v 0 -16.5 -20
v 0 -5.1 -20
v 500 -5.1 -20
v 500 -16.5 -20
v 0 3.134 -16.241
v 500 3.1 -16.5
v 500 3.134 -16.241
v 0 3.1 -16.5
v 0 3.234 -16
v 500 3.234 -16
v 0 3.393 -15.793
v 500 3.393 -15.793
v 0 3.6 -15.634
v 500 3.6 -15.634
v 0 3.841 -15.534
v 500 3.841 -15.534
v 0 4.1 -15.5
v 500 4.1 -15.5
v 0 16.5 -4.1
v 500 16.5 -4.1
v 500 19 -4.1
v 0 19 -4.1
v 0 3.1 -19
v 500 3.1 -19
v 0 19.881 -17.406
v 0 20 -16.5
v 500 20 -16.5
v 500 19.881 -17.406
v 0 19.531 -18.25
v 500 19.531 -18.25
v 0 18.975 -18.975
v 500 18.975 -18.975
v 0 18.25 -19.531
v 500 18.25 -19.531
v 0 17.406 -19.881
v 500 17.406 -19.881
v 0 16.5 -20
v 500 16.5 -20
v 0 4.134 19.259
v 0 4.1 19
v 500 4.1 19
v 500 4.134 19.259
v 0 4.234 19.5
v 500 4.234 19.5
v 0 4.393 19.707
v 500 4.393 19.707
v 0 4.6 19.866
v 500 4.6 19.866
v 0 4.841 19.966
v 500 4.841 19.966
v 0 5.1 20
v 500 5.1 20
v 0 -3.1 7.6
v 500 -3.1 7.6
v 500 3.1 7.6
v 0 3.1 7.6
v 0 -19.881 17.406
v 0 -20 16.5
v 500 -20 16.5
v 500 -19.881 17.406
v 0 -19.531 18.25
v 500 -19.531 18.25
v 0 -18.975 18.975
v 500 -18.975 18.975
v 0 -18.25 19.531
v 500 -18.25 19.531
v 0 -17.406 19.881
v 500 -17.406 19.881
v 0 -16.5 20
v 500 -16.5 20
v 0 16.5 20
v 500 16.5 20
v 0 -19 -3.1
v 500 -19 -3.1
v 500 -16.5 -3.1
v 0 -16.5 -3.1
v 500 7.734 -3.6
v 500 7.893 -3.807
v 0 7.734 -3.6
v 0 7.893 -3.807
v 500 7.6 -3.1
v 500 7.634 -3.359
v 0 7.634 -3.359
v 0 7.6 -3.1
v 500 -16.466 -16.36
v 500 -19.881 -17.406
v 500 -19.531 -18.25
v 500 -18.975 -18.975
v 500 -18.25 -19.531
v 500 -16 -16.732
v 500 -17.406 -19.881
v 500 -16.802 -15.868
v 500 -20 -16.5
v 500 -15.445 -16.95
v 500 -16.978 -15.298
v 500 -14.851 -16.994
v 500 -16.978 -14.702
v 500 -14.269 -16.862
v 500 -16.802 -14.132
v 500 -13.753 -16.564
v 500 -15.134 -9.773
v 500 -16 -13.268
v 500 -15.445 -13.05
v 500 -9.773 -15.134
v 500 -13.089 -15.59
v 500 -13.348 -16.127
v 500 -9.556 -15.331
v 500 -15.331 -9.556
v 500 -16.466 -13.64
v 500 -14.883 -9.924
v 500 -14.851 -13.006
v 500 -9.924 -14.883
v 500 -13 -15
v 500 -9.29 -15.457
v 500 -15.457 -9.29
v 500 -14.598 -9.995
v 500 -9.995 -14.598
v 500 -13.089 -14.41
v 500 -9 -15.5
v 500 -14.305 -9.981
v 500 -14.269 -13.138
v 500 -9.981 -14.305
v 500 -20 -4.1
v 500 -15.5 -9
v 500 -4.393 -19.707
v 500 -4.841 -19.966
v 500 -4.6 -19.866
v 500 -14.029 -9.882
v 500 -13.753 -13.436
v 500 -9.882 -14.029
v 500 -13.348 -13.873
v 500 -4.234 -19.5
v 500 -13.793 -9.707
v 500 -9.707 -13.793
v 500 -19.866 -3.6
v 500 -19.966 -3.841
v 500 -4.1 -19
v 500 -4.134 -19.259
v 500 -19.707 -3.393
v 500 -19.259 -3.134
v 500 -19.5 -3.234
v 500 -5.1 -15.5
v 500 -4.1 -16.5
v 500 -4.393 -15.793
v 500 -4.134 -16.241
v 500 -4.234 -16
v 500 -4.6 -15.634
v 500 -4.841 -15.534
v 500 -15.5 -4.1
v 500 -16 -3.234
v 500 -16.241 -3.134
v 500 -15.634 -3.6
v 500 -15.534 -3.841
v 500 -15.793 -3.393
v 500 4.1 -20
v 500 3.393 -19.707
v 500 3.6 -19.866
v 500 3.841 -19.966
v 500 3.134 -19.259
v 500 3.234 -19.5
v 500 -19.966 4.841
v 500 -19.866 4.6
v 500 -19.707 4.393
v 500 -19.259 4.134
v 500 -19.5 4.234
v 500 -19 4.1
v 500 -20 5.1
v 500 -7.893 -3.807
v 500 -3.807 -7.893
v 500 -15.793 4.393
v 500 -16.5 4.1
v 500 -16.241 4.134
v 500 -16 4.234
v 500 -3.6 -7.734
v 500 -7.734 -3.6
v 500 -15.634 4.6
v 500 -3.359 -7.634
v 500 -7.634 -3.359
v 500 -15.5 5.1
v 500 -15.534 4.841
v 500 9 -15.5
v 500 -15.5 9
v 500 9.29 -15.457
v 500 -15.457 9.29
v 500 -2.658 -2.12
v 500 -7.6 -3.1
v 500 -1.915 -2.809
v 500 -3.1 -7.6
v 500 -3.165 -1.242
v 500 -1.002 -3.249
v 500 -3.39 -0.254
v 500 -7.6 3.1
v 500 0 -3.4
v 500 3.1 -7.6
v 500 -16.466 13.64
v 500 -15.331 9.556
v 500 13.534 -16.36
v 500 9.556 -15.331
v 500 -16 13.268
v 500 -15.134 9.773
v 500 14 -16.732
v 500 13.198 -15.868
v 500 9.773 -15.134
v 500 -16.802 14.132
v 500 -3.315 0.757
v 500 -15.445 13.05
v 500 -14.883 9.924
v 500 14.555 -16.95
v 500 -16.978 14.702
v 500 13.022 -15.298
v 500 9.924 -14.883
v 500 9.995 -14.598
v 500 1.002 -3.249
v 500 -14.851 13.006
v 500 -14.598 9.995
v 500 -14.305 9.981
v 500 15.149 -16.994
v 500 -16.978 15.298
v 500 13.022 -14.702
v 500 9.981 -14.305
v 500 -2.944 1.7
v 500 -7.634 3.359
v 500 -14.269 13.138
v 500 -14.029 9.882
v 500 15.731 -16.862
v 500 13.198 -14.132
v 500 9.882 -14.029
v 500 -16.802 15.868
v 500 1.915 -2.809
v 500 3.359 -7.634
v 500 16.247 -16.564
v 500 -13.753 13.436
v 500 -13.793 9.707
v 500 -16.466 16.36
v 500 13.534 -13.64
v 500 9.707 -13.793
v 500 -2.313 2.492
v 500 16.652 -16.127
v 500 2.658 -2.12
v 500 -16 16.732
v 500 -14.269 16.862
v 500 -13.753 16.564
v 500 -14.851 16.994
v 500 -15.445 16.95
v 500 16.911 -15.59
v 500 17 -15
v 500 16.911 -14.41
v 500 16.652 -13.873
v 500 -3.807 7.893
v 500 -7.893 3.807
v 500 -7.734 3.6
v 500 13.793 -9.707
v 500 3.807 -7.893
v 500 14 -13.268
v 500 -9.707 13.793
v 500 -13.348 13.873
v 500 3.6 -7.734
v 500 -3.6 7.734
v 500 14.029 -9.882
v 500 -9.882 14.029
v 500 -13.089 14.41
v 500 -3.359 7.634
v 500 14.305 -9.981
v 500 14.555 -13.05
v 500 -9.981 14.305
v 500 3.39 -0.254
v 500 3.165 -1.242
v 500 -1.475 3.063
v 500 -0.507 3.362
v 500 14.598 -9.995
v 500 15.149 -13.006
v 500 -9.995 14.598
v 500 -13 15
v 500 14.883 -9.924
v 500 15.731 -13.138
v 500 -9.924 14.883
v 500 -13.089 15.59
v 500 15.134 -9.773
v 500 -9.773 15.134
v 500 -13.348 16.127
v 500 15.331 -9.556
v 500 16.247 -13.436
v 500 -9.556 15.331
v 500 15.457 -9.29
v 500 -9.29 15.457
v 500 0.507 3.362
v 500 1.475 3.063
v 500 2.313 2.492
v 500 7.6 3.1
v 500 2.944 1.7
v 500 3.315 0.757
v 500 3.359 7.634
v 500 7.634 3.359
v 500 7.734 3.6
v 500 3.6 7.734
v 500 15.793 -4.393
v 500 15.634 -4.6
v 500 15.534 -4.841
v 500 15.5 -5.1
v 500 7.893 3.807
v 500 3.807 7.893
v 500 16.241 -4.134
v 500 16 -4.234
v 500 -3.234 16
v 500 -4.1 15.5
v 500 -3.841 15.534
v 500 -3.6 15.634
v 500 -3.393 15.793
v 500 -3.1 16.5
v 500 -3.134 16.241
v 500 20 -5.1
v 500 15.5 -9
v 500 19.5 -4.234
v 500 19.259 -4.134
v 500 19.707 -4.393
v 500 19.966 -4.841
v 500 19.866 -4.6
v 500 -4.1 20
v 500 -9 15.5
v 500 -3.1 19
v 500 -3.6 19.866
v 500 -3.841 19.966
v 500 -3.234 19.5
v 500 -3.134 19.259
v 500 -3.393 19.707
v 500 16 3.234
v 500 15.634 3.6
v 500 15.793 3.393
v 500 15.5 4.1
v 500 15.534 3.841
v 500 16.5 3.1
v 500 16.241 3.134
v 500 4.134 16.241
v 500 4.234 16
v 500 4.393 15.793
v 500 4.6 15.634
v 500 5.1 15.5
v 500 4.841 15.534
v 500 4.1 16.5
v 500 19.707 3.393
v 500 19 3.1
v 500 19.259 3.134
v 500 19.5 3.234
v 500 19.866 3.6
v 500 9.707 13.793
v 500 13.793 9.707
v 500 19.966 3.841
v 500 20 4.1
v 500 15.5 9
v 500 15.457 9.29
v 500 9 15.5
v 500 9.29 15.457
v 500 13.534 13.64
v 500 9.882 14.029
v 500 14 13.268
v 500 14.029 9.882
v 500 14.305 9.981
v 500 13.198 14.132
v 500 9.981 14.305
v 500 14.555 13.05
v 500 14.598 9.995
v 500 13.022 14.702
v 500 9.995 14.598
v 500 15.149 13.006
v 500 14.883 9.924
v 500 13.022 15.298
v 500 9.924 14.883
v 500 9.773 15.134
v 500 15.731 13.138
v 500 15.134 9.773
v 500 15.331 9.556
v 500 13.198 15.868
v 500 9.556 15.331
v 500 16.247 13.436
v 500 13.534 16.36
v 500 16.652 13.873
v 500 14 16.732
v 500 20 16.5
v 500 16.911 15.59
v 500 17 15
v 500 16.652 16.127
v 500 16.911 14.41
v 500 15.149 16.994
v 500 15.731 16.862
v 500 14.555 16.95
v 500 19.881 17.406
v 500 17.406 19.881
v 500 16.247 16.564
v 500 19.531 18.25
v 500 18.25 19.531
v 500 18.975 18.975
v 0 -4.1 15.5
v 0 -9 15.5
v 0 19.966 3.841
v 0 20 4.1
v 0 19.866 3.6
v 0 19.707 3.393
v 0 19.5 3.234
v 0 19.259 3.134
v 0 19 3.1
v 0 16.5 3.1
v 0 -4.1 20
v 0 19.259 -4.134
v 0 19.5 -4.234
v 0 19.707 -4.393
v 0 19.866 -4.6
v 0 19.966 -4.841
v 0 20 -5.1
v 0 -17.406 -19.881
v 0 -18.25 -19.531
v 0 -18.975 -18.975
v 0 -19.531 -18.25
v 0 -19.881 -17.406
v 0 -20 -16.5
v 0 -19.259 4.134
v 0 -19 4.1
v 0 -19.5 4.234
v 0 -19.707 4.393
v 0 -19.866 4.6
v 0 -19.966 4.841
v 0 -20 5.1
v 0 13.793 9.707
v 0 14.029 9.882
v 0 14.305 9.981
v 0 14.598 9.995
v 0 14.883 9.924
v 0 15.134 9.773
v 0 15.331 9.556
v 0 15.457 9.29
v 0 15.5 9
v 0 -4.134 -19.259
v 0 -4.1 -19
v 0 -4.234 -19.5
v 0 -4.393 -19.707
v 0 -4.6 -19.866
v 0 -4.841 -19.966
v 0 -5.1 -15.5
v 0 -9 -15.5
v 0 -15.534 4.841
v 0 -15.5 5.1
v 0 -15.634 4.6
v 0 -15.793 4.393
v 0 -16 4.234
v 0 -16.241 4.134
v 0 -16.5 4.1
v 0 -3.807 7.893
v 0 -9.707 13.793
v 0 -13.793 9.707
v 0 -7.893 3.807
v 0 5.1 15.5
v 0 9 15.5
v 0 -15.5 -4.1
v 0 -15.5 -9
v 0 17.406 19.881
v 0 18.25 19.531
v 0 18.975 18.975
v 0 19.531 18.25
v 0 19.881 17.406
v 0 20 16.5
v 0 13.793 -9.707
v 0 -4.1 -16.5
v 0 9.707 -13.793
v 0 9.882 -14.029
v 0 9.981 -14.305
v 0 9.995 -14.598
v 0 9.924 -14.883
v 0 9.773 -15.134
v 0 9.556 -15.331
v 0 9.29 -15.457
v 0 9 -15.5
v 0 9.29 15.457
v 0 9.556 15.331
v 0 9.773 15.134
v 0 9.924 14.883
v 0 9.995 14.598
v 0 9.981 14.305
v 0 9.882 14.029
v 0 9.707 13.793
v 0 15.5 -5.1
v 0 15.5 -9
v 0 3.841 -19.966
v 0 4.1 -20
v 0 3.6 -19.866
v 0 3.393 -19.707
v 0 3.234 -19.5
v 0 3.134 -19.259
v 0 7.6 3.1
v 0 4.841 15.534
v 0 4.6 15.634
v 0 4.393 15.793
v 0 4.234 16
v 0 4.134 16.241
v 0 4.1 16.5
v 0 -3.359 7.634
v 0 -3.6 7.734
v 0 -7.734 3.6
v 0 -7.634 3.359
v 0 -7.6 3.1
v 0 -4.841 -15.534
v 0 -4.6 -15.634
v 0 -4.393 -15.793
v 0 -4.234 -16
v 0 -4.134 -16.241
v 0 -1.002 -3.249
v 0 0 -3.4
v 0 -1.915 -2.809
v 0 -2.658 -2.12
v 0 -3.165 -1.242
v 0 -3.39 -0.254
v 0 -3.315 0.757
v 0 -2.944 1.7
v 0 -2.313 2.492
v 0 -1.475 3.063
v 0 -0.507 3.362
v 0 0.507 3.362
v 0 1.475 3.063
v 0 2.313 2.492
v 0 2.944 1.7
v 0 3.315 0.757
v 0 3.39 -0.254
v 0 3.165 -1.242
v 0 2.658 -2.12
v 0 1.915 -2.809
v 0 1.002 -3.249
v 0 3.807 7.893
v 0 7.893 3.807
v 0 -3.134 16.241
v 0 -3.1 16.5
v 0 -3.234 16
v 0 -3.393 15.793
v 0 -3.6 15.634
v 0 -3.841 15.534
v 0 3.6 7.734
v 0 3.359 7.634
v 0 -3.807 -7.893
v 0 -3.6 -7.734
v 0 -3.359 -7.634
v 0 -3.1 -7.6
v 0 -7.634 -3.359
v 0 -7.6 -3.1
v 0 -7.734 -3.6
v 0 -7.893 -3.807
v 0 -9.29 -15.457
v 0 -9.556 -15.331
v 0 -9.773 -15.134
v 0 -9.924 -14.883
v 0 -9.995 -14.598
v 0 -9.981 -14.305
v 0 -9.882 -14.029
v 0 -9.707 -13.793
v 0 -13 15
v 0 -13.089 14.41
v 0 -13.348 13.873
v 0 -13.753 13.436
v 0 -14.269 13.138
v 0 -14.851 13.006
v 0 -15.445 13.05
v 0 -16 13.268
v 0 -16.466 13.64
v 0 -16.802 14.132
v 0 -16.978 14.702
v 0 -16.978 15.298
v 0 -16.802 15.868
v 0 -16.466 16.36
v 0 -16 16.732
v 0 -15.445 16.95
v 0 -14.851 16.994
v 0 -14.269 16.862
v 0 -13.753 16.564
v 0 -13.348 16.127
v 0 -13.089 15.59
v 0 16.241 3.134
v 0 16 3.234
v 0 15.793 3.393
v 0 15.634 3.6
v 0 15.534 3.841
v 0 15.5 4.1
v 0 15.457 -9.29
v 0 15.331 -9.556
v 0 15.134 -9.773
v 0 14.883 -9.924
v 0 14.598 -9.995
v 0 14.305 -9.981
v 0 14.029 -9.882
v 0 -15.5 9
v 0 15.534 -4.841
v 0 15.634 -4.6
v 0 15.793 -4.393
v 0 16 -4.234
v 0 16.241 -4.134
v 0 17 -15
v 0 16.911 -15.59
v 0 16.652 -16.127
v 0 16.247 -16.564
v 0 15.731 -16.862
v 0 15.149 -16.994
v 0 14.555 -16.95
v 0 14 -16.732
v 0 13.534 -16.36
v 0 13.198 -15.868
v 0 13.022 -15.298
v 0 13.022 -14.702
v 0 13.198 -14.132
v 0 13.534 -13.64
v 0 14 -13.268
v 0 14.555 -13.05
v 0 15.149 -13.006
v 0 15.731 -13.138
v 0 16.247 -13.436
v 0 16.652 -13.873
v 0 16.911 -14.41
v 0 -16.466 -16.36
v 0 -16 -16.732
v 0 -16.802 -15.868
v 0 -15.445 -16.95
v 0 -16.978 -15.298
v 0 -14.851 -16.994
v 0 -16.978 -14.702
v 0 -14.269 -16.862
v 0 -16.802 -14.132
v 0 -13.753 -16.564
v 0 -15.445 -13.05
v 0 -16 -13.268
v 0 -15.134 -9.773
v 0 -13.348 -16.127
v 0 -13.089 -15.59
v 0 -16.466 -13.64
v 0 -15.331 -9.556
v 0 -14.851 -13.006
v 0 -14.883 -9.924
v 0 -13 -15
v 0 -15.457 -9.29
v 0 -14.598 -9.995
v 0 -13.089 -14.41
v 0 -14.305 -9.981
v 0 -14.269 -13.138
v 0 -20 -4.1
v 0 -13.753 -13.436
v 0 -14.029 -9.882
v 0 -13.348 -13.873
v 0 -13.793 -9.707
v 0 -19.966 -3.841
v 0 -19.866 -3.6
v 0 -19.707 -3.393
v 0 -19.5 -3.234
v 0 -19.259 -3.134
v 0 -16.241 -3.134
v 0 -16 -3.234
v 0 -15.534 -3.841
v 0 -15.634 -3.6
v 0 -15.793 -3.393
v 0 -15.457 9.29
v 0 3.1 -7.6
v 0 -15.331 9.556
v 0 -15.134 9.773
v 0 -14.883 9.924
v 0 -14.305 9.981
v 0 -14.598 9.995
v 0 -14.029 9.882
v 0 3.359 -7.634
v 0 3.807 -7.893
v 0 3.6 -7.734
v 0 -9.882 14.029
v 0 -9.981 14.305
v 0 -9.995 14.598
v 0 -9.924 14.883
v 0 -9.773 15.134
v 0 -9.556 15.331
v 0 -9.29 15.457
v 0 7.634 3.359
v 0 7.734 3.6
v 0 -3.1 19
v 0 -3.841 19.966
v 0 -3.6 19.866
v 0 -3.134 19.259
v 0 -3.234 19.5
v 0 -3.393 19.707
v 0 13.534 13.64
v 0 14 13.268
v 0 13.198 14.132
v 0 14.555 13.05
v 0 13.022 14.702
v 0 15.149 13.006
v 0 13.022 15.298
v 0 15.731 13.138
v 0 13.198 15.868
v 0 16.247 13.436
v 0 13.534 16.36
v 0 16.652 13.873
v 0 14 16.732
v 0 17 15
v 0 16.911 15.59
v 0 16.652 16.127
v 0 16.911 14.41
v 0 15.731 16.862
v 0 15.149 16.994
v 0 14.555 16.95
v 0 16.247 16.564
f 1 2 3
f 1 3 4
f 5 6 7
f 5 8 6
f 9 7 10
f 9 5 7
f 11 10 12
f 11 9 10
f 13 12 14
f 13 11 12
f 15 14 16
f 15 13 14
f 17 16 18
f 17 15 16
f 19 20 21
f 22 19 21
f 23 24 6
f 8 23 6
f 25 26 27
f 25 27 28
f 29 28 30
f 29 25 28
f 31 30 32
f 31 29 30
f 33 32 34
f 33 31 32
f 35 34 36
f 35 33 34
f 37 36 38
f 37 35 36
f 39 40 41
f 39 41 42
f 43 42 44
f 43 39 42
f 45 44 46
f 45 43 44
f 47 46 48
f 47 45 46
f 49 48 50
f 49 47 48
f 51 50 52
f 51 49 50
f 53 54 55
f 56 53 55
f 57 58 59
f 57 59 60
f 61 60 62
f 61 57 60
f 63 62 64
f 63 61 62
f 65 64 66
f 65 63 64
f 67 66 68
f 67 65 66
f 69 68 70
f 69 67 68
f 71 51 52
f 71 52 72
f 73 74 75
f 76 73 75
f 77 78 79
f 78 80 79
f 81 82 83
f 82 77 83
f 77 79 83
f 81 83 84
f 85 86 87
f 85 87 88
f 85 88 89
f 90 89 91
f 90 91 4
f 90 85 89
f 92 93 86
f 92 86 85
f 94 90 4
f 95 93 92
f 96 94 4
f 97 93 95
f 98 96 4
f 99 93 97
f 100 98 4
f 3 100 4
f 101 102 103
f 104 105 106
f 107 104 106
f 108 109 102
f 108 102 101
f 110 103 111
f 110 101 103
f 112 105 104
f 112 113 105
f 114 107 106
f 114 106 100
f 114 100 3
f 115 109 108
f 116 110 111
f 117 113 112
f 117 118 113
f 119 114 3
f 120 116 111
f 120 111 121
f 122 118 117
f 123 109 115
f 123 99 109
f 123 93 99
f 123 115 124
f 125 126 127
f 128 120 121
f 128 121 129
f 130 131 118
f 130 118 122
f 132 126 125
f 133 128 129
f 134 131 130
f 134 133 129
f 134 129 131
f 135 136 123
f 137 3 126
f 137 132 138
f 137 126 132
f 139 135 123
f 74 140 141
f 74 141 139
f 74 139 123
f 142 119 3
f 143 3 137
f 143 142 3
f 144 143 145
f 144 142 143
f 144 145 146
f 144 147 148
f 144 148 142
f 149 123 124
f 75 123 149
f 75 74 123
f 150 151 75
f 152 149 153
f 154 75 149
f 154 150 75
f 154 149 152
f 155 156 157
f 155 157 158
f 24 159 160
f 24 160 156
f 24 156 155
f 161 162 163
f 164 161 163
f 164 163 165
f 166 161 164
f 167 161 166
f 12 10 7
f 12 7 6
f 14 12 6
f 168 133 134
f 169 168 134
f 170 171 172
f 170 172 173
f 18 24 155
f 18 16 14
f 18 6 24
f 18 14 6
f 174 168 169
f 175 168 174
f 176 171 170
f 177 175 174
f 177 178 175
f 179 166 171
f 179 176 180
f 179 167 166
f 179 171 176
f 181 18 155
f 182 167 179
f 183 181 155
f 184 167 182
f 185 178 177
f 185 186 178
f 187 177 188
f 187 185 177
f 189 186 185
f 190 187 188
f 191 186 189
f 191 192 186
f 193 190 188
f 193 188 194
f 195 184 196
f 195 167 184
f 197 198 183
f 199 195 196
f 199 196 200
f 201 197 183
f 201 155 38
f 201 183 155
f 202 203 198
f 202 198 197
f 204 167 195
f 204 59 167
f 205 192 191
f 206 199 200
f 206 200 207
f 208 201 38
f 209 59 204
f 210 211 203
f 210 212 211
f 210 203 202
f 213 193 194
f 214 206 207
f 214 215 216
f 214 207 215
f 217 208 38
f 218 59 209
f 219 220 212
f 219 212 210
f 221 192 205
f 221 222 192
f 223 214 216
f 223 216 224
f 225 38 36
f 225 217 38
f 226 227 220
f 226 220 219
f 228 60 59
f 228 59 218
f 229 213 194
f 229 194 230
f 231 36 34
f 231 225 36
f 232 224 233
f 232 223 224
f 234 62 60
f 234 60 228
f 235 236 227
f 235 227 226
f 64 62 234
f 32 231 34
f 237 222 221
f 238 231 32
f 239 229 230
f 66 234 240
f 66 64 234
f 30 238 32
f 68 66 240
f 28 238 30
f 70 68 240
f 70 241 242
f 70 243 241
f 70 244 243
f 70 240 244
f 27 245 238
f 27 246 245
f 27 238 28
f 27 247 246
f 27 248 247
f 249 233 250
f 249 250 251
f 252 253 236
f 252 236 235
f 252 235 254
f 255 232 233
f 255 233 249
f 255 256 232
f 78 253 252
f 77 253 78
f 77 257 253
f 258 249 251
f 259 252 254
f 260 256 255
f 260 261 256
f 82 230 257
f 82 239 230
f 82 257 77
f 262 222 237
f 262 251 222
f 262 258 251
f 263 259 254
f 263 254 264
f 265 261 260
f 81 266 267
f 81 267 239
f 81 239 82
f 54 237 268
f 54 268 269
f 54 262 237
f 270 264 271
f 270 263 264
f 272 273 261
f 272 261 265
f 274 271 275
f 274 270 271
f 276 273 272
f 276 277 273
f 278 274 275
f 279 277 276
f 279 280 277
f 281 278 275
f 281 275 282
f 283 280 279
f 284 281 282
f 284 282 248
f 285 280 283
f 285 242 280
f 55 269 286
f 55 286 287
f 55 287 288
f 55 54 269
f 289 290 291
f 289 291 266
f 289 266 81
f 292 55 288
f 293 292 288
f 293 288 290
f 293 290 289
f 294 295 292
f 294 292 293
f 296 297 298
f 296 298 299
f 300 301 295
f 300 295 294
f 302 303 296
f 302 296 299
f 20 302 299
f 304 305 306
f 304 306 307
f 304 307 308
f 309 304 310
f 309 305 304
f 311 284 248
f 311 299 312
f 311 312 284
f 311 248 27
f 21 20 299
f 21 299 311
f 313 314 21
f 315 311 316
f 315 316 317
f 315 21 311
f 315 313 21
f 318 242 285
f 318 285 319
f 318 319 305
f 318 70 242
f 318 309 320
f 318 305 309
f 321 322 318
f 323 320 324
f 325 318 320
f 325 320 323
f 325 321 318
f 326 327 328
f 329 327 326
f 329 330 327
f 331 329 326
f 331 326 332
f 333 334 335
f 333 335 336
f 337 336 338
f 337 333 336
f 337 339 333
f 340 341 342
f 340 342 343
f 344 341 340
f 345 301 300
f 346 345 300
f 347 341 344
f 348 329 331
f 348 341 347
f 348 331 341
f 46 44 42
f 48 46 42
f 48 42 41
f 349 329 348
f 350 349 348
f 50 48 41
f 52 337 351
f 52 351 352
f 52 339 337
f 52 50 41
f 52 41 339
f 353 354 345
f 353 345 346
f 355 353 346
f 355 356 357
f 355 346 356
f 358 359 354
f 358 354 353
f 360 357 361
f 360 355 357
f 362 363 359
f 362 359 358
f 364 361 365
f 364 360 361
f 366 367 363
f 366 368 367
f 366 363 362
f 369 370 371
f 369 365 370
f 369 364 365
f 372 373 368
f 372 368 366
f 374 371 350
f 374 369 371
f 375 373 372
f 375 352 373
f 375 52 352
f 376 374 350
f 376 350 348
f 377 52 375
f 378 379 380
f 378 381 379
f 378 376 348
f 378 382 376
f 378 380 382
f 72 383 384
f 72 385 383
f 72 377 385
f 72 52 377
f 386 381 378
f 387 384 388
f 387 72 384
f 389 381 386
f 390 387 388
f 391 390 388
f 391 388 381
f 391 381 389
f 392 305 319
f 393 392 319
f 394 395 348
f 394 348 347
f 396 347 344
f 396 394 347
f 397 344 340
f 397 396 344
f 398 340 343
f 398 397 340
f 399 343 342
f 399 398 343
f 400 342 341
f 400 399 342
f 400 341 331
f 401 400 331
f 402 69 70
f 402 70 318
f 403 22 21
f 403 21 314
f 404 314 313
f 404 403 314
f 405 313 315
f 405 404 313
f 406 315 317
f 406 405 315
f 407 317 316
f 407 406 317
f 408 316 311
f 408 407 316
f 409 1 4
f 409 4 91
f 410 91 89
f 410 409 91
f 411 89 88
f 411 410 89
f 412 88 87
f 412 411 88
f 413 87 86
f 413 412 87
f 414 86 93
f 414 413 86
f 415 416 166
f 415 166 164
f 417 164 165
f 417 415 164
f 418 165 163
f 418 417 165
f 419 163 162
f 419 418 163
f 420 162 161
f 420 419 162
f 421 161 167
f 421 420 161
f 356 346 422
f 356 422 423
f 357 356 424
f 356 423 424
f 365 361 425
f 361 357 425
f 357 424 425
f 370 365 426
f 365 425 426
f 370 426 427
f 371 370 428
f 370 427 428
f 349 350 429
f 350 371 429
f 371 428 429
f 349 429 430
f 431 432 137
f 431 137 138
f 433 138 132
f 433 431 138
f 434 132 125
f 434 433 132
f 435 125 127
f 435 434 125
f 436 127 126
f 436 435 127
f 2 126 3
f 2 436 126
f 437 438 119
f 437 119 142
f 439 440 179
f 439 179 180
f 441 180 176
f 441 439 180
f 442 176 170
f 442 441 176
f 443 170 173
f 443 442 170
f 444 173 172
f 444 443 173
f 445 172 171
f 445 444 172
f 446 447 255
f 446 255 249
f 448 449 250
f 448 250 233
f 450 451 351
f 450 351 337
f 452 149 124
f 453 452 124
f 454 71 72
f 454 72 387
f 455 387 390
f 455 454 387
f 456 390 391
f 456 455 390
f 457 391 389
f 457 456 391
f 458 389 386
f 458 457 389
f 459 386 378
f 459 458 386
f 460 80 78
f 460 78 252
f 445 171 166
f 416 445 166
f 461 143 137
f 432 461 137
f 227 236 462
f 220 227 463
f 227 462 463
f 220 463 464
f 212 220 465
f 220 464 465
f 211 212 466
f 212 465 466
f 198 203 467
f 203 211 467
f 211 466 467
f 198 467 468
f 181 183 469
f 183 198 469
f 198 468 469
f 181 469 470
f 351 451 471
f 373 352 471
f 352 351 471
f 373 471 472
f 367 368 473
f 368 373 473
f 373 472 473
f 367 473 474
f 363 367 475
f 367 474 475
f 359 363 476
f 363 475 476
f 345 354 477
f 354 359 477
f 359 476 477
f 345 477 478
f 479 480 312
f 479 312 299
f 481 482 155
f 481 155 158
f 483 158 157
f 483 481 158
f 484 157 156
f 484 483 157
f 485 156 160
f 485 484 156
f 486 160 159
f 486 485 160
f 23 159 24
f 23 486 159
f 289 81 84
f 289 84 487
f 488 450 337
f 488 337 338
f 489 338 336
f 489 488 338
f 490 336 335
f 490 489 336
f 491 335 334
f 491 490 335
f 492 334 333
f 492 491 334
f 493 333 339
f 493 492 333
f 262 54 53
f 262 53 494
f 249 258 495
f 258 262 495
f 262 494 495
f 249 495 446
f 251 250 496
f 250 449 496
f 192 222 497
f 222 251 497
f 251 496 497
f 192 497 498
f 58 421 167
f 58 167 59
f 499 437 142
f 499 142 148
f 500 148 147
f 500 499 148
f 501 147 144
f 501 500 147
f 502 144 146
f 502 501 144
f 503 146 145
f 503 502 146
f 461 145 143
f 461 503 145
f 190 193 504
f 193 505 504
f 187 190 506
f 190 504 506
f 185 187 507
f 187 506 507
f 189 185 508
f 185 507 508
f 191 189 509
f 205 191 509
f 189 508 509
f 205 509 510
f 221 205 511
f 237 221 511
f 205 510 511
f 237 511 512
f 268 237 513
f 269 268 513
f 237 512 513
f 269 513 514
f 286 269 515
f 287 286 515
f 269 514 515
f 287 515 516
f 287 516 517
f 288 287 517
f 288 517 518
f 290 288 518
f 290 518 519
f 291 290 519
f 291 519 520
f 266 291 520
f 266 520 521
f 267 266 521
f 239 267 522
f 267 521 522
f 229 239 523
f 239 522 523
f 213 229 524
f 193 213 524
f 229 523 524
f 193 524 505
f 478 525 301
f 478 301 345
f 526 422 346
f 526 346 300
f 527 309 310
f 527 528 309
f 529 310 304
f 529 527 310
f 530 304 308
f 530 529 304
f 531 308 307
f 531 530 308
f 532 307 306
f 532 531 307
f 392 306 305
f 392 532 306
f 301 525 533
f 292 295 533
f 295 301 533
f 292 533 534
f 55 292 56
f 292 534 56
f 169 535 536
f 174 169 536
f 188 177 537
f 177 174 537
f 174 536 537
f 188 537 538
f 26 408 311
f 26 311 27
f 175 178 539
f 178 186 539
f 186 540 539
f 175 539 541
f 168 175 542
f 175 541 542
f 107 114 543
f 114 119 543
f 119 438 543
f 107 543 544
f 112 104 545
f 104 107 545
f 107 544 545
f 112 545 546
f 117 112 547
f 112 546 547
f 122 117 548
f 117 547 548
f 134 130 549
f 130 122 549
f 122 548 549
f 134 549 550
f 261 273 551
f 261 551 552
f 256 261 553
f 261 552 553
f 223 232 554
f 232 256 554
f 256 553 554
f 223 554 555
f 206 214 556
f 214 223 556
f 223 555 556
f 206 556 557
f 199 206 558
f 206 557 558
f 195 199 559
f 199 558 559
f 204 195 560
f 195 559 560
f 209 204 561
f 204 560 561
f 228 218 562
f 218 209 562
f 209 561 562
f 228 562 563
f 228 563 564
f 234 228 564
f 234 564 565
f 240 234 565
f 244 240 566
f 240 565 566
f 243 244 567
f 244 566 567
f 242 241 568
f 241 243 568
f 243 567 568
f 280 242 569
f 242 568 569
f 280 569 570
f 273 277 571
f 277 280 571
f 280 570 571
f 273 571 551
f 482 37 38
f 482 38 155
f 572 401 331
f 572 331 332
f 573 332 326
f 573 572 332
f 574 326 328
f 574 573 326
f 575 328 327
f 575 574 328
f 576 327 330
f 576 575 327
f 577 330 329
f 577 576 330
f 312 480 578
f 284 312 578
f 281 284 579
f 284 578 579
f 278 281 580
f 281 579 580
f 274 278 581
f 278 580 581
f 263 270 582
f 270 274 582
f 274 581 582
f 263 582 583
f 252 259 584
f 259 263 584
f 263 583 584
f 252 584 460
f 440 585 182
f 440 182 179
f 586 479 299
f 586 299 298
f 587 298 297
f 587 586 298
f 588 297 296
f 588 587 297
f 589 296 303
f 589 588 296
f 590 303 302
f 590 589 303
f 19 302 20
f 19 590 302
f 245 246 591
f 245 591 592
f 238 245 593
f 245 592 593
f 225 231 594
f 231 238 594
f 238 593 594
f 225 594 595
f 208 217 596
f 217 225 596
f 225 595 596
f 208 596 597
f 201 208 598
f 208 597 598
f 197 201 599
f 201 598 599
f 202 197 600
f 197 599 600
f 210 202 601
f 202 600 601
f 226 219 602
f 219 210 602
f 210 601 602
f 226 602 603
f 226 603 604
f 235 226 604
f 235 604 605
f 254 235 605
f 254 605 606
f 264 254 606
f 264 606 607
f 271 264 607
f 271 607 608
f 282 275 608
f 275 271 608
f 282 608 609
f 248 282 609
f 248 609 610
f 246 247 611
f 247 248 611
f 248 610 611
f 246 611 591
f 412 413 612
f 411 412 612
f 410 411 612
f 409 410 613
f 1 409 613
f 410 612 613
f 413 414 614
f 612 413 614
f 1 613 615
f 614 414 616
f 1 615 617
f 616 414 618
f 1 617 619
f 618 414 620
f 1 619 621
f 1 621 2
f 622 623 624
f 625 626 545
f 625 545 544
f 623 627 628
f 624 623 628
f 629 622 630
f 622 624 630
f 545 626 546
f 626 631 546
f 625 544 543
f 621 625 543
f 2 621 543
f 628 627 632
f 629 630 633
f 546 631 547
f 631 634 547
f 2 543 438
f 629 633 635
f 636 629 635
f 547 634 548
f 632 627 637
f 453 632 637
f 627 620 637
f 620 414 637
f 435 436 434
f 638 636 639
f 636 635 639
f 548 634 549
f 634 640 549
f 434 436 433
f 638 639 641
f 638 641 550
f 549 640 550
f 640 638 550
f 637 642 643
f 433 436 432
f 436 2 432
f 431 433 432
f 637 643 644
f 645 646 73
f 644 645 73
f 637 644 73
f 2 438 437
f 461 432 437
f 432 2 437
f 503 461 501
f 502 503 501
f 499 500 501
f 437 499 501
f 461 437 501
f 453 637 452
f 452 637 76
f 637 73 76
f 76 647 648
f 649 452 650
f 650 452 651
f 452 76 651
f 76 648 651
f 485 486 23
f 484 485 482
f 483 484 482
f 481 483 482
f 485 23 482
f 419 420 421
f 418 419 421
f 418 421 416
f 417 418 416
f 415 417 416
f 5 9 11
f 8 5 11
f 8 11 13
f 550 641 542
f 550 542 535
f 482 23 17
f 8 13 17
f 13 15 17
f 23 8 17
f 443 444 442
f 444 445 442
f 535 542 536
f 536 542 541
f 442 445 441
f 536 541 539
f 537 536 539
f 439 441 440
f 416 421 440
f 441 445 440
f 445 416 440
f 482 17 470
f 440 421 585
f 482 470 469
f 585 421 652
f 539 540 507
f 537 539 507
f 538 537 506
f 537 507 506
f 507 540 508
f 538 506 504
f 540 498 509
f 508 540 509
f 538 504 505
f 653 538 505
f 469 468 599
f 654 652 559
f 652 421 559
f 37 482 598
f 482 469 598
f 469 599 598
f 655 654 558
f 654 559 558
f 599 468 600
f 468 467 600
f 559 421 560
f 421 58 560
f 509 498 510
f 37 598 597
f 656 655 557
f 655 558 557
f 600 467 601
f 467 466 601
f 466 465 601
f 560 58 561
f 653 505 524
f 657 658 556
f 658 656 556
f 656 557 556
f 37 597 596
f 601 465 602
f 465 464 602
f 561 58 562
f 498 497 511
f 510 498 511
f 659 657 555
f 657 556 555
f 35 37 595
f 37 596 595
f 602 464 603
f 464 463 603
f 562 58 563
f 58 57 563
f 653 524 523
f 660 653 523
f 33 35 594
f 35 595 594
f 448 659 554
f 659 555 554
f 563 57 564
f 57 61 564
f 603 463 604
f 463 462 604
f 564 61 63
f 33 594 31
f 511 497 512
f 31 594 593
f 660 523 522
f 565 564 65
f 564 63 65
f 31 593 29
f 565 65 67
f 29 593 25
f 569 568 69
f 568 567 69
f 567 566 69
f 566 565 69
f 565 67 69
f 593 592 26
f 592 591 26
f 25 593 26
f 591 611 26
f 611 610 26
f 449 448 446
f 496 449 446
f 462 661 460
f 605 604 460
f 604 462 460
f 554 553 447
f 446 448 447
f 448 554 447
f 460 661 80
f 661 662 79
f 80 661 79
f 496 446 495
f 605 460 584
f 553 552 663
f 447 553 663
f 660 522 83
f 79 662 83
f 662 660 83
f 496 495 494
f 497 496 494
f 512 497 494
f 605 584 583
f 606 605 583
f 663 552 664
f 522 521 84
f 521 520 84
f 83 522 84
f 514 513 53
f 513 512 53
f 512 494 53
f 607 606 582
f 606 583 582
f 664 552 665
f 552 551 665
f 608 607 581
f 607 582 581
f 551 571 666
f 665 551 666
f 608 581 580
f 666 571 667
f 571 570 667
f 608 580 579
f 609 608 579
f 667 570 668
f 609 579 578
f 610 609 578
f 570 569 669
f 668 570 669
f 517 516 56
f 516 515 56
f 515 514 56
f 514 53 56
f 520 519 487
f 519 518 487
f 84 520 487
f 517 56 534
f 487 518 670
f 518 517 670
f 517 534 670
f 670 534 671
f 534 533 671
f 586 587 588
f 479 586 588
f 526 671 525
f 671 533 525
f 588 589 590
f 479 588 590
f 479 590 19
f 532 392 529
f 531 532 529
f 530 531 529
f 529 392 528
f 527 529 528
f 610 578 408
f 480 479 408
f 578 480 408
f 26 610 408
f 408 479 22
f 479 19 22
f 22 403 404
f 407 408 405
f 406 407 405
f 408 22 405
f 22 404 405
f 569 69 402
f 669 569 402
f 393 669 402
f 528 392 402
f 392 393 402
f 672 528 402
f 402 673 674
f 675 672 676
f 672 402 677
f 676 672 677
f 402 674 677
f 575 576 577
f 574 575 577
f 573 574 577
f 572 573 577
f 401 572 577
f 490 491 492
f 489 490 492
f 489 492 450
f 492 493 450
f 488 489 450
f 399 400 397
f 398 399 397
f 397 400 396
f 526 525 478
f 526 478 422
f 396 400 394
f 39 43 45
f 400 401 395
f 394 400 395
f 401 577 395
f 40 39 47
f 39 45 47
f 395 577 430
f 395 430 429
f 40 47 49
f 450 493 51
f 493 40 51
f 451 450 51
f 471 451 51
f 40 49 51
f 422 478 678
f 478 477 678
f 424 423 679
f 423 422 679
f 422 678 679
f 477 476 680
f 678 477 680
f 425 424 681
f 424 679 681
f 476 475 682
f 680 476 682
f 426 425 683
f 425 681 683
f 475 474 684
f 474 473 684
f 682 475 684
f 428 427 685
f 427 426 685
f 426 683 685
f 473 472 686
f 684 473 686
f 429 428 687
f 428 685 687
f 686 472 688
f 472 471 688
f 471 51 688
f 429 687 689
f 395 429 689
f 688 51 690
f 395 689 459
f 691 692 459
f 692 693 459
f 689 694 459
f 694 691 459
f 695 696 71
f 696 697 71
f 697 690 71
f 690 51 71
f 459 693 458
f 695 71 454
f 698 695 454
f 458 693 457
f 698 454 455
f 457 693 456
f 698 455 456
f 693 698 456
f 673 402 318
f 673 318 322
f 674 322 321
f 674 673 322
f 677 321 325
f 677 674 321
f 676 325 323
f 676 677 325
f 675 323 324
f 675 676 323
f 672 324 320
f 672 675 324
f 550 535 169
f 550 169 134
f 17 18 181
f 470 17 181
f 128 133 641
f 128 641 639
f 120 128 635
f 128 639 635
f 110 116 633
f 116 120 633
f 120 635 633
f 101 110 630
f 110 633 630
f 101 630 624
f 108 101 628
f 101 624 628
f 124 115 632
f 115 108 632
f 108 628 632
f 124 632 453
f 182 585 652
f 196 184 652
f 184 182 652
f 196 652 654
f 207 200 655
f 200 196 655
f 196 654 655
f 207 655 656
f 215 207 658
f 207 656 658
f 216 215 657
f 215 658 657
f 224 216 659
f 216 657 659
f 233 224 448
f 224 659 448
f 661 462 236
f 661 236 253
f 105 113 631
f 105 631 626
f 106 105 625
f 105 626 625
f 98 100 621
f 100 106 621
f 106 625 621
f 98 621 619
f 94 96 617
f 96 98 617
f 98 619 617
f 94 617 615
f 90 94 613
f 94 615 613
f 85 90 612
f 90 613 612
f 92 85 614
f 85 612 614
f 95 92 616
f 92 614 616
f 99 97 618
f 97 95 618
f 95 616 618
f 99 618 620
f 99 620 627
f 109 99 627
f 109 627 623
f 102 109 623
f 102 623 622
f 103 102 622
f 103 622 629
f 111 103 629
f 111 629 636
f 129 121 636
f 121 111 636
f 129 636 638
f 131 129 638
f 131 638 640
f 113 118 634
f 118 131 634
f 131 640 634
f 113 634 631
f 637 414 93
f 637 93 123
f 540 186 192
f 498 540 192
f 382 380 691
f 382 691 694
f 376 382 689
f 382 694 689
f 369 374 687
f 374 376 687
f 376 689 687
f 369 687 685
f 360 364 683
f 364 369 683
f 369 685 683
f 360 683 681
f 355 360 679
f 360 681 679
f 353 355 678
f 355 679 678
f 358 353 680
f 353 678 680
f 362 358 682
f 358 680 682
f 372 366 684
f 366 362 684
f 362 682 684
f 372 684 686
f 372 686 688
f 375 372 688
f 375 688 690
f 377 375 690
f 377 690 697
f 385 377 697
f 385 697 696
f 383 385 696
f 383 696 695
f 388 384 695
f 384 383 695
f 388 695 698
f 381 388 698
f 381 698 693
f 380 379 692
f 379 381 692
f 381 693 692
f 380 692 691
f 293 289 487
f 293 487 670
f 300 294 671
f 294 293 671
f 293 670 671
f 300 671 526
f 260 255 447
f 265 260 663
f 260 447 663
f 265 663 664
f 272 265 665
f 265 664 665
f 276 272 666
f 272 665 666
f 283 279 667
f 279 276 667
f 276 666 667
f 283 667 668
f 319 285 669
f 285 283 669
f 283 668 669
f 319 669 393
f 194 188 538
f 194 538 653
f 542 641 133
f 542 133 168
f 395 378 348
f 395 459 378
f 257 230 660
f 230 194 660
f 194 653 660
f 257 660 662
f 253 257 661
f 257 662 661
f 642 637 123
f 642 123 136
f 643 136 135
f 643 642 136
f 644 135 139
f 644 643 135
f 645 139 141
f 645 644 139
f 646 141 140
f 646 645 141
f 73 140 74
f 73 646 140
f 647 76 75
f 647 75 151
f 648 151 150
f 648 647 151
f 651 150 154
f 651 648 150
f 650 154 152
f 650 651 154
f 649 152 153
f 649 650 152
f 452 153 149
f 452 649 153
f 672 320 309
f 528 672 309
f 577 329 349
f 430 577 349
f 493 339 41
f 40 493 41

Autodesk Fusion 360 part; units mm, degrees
sketch "Sketch1" plane through (0, 0, 0) normal (1, 0, 0) x (0, 1, 0)
  line L0 (0, 0) -> (0, 40) construction
  line L1 (0, 0) -> (40, 0) construction
  line L2 (0, 7.6) -> (3.1, 7.6)
  arc A0 (3.1, 7.6) -> (3.8071, 7.8929) centre (3.1, 8.6) ccw
  line L3 (3.8071, 7.8929) -> (9.7071, 13.7929)
  arc A1 (9.7071, 13.7929) -> (9, 15.5) centre (9, 14.5) ccw
  line L4 (9, 15.5) -> (5.1, 15.5)
  arc A2 (4.1, 16.5) -> (5.1, 15.5) centre (5.1, 16.5) ccw
  line L5 (4.1, 16.5) -> (4.1, 19)
  arc A3 (5.1, 20) -> (4.1, 19) centre (5.1, 19) ccw
  line L6 (5.1, 20) -> (16.5, 20)
  arc A4 (20, 16.5) -> (16.5, 20) centre (16.5, 16.5) ccw
  line L7 (20, 16.5) -> (20, 4.1)
  arc A5 (19, 3.1) -> (20, 4.1) centre (19, 4.1) ccw
  line L8 (19, 3.1) -> (16.5, 3.1)
  arc A6 (15.5, 4.1) -> (16.5, 3.1) centre (16.5, 4.1) ccw
  line L9 (15.5, 4.1) -> (15.5, 9)
  line L10 (7.6, 0) -> (7.6, 3.1)
  arc A7 (15.5, 9) -> (13.7929, 9.7071) centre (14.5, 9) ccw
  line L11 (13.7929, 9.7071) -> (7.8929, 3.8071)
  arc A8 (7.8929, 3.8071) -> (7.6, 3.1) centre (8.6, 3.1) ccw
  arc A9 (3.4, 0) -> (0, 3.4) centre (0, 0) ccw
  line L12 (0, 0) -> (3.4, 0) construction
  line L13 (0, 0) -> (0, 3.4) construction
  line L14 (0, 7.6) -> (0, 3.4)
  line L15 (3.4, 0) -> (7.6, 0)
  line L16 (-7.6, 0) -> (-3.4, 0)
  arc A10 (-3.8071, 7.8929) -> (-3.1, 7.6) centre (-3.1, 8.6) ccw
  line L17 (-7.6, 0) -> (-7.6, 3.1)
  arc A11 (-7.6, 3.1) -> (-7.8929, 3.8071) centre (-8.6, 3.1) ccw
  line L18 (0, 7.6) -> (-3.1, 7.6)
  line L19 (0, 3.4) -> (0, 7.6)
  arc A12 (0, 3.4) -> (-3.4, 0) centre (0, 0) ccw
  arc A13 (-13.7929, 9.7071) -> (-15.5, 9) centre (-14.5, 9) ccw
  line L20 (-20, 5.1) -> (-20, 16.5)
  arc A14 (-16.5, 20) -> (-20, 16.5) centre (-16.5, 16.5) ccw
  arc A15 (-20, 5.1) -> (-19, 4.1) centre (-19, 5.1) ccw
  arc A16 (-16.5, 4.1) -> (-15.5, 5.1) centre (-16.5, 5.1) ccw
  arc A17 (-9, 15.5) -> (-9.7071, 13.7929) centre (-9, 14.5) ccw
  line L21 (-7.8929, 3.8071) -> (-13.7929, 9.7071)
  line L22 (-15.5, 9) -> (-15.5, 5.1)
  line L23 (-16.5, 4.1) -> (-19, 4.1)
  arc A18 (-3.1, 19) -> (-4.1, 20) centre (-4.1, 19) ccw
  line L24 (-16.5, 20) -> (-4.1, 20)
  line L25 (-4.1, 15.5) -> (-9, 15.5)
  line L26 (-3.1, 19) -> (-3.1, 16.5)
  arc A19 (-4.1, 15.5) -> (-3.1, 16.5) centre (-4.1, 16.5) ccw
  line L27 (-9.7071, 13.7929) -> (-3.8071, 7.8929)
  line L28 (0, -7.6) -> (0, -3.4)
  arc A20 (-7.8929, -3.8071) -> (-7.6, -3.1) centre (-8.6, -3.1) ccw
  line L29 (0, -7.6) -> (-3.1, -7.6)
  arc A21 (-3.1, -7.6) -> (-3.8071, -7.8929) centre (-3.1, -8.6) ccw
  line L30 (-7.6, 0) -> (-7.6, -3.1)
  line L31 (-3.4, 0) -> (-7.6, 0)
  arc A22 (-3.4, 0) -> (0, -3.4) centre (0, 0) ccw
  arc A23 (-9.7071, -13.7929) -> (-9, -15.5) centre (-9, -14.5) ccw
  line L32 (-5.1, -20) -> (-16.5, -20)
  arc A24 (-20, -16.5) -> (-16.5, -20) centre (-16.5, -16.5) ccw
  arc A25 (-5.1, -20) -> (-4.1, -19) centre (-5.1, -19) ccw
  arc A26 (-4.1, -16.5) -> (-5.1, -15.5) centre (-5.1, -16.5) ccw
  arc A27 (-15.5, -9) -> (-13.7929, -9.7071) centre (-14.5, -9) ccw
  line L33 (-3.8071, -7.8929) -> (-9.7071, -13.7929)
  line L34 (-9, -15.5) -> (-5.1, -15.5)
  line L35 (-4.1, -16.5) -> (-4.1, -19)
  arc A28 (-19, -3.1) -> (-20, -4.1) centre (-19, -4.1) ccw
  line L36 (-20, -16.5) -> (-20, -4.1)
  line L37 (-15.5, -4.1) -> (-15.5, -9)
  line L38 (-19, -3.1) -> (-16.5, -3.1)
  arc A29 (-15.5, -4.1) -> (-16.5, -3.1) centre (-16.5, -4.1) ccw
  line L39 (-13.7929, -9.7071) -> (-7.8929, -3.8071)
  line L40 (7.6, 0) -> (3.4, 0)
  arc A30 (3.8071, -7.8929) -> (3.1, -7.6) centre (3.1, -8.6) ccw
  line L41 (7.6, 0) -> (7.6, -3.1)
  arc A31 (7.6, -3.1) -> (7.8929, -3.8071) centre (8.6, -3.1) ccw
  line L42 (0, -7.6) -> (3.1, -7.6)
  line L43 (0, -3.4) -> (0, -7.6)
  arc A32 (0, -3.4) -> (3.4, 0) centre (0, 0) ccw
  arc A33 (13.7929, -9.7071) -> (15.5, -9) centre (14.5, -9) ccw
  line L44 (20, -5.1) -> (20, -16.5)
  arc A34 (16.5, -20) -> (20, -16.5) centre (16.5, -16.5) ccw
  arc A35 (20, -5.1) -> (19, -4.1) centre (19, -5.1) ccw
  arc A36 (16.5, -4.1) -> (15.5, -5.1) centre (16.5, -5.1) ccw
  arc A37 (9, -15.5) -> (9.7071, -13.7929) centre (9, -14.5) ccw
  line L45 (7.8929, -3.8071) -> (13.7929, -9.7071)
  line L46 (15.5, -9) -> (15.5, -5.1)
  line L47 (16.5, -4.1) -> (19, -4.1)
  arc A38 (3.1, -19) -> (4.1, -20) centre (4.1, -19) ccw
  line L48 (16.5, -20) -> (4.1, -20)
  line L49 (4.1, -15.5) -> (9, -15.5)
  line L50 (3.1, -19) -> (3.1, -16.5)
  arc A39 (4.1, -15.5) -> (3.1, -16.5) centre (4.1, -16.5) ccw
  line L51 (9.7071, -13.7929) -> (3.8071, -7.8929)
  circle A40 centre (15, 15) radius 2
  circle A41 centre (-15, 15) radius 2
  circle A42 centre (-15, -15) radius 2
  circle A43 centre (15, -15) radius 2
  dimension "d26" = 40
  dimension "d27" = 40
  dimension "d31" = 20
  dimension "d32" = 3.5
  dimension "d33" = 7.6
  dimension "d35" = 4.5
  dimension "d36" = 1
  dimension "d37" = 1
  dimension "d38" = 1
  dimension "d39" = 1
  dimension "d40" = 4.5
  dimension "d41" = 4.1
  dimension "d42" = 4.1
  dimension "d43" = 16.5
  dimension "d44" = 7.6
  dimension "d45" = 1
  dimension "d46" = 1
  dimension "d47" = 1
  dimension "d48" = 1
  dimension "d49" = 9
  dimension "d50" = 9
  dimension "d51" = 1
  dimension "d52" = 1
  dimension "d53" = 3.4
  dimension "d54" = 90
  dimension "d56" = 360
  dimension "d60" = 4
  dimension "d61" = 15
  dimension "d62" = 15
extrude "Extrude2" add sketch "Sketch1" along normal blind 500 contours L2 A0 L3 A1 L4 A2 L5 A3 L6 A4 L7 A5 L8 A6 L9 L10 A7 L11 A8 A9 L14 L15 L19 L40 | L14 L16 A10 L17 A11 L18 L19 A12 A13 L20 A14 A15 A16 A17 L21 L22 L23 A18 L24 L25 L26 A19 L27 L31 | L15 L28 L40 A30 L41 A31 L42 L43 A32 A33 L44 A34 A35 A36 A37 L45 L46 L47 A38 L48 L49 L50 A39 L51 | L16 L28 A20 L29 A21 L30 L31 A22 A23 L32 A24 A25 A26 A27 L33 L34 L35 A28 L36 L37 L38 A29 L39 L43
equation "Length = 500 mm"
equation "d63 = Length"
